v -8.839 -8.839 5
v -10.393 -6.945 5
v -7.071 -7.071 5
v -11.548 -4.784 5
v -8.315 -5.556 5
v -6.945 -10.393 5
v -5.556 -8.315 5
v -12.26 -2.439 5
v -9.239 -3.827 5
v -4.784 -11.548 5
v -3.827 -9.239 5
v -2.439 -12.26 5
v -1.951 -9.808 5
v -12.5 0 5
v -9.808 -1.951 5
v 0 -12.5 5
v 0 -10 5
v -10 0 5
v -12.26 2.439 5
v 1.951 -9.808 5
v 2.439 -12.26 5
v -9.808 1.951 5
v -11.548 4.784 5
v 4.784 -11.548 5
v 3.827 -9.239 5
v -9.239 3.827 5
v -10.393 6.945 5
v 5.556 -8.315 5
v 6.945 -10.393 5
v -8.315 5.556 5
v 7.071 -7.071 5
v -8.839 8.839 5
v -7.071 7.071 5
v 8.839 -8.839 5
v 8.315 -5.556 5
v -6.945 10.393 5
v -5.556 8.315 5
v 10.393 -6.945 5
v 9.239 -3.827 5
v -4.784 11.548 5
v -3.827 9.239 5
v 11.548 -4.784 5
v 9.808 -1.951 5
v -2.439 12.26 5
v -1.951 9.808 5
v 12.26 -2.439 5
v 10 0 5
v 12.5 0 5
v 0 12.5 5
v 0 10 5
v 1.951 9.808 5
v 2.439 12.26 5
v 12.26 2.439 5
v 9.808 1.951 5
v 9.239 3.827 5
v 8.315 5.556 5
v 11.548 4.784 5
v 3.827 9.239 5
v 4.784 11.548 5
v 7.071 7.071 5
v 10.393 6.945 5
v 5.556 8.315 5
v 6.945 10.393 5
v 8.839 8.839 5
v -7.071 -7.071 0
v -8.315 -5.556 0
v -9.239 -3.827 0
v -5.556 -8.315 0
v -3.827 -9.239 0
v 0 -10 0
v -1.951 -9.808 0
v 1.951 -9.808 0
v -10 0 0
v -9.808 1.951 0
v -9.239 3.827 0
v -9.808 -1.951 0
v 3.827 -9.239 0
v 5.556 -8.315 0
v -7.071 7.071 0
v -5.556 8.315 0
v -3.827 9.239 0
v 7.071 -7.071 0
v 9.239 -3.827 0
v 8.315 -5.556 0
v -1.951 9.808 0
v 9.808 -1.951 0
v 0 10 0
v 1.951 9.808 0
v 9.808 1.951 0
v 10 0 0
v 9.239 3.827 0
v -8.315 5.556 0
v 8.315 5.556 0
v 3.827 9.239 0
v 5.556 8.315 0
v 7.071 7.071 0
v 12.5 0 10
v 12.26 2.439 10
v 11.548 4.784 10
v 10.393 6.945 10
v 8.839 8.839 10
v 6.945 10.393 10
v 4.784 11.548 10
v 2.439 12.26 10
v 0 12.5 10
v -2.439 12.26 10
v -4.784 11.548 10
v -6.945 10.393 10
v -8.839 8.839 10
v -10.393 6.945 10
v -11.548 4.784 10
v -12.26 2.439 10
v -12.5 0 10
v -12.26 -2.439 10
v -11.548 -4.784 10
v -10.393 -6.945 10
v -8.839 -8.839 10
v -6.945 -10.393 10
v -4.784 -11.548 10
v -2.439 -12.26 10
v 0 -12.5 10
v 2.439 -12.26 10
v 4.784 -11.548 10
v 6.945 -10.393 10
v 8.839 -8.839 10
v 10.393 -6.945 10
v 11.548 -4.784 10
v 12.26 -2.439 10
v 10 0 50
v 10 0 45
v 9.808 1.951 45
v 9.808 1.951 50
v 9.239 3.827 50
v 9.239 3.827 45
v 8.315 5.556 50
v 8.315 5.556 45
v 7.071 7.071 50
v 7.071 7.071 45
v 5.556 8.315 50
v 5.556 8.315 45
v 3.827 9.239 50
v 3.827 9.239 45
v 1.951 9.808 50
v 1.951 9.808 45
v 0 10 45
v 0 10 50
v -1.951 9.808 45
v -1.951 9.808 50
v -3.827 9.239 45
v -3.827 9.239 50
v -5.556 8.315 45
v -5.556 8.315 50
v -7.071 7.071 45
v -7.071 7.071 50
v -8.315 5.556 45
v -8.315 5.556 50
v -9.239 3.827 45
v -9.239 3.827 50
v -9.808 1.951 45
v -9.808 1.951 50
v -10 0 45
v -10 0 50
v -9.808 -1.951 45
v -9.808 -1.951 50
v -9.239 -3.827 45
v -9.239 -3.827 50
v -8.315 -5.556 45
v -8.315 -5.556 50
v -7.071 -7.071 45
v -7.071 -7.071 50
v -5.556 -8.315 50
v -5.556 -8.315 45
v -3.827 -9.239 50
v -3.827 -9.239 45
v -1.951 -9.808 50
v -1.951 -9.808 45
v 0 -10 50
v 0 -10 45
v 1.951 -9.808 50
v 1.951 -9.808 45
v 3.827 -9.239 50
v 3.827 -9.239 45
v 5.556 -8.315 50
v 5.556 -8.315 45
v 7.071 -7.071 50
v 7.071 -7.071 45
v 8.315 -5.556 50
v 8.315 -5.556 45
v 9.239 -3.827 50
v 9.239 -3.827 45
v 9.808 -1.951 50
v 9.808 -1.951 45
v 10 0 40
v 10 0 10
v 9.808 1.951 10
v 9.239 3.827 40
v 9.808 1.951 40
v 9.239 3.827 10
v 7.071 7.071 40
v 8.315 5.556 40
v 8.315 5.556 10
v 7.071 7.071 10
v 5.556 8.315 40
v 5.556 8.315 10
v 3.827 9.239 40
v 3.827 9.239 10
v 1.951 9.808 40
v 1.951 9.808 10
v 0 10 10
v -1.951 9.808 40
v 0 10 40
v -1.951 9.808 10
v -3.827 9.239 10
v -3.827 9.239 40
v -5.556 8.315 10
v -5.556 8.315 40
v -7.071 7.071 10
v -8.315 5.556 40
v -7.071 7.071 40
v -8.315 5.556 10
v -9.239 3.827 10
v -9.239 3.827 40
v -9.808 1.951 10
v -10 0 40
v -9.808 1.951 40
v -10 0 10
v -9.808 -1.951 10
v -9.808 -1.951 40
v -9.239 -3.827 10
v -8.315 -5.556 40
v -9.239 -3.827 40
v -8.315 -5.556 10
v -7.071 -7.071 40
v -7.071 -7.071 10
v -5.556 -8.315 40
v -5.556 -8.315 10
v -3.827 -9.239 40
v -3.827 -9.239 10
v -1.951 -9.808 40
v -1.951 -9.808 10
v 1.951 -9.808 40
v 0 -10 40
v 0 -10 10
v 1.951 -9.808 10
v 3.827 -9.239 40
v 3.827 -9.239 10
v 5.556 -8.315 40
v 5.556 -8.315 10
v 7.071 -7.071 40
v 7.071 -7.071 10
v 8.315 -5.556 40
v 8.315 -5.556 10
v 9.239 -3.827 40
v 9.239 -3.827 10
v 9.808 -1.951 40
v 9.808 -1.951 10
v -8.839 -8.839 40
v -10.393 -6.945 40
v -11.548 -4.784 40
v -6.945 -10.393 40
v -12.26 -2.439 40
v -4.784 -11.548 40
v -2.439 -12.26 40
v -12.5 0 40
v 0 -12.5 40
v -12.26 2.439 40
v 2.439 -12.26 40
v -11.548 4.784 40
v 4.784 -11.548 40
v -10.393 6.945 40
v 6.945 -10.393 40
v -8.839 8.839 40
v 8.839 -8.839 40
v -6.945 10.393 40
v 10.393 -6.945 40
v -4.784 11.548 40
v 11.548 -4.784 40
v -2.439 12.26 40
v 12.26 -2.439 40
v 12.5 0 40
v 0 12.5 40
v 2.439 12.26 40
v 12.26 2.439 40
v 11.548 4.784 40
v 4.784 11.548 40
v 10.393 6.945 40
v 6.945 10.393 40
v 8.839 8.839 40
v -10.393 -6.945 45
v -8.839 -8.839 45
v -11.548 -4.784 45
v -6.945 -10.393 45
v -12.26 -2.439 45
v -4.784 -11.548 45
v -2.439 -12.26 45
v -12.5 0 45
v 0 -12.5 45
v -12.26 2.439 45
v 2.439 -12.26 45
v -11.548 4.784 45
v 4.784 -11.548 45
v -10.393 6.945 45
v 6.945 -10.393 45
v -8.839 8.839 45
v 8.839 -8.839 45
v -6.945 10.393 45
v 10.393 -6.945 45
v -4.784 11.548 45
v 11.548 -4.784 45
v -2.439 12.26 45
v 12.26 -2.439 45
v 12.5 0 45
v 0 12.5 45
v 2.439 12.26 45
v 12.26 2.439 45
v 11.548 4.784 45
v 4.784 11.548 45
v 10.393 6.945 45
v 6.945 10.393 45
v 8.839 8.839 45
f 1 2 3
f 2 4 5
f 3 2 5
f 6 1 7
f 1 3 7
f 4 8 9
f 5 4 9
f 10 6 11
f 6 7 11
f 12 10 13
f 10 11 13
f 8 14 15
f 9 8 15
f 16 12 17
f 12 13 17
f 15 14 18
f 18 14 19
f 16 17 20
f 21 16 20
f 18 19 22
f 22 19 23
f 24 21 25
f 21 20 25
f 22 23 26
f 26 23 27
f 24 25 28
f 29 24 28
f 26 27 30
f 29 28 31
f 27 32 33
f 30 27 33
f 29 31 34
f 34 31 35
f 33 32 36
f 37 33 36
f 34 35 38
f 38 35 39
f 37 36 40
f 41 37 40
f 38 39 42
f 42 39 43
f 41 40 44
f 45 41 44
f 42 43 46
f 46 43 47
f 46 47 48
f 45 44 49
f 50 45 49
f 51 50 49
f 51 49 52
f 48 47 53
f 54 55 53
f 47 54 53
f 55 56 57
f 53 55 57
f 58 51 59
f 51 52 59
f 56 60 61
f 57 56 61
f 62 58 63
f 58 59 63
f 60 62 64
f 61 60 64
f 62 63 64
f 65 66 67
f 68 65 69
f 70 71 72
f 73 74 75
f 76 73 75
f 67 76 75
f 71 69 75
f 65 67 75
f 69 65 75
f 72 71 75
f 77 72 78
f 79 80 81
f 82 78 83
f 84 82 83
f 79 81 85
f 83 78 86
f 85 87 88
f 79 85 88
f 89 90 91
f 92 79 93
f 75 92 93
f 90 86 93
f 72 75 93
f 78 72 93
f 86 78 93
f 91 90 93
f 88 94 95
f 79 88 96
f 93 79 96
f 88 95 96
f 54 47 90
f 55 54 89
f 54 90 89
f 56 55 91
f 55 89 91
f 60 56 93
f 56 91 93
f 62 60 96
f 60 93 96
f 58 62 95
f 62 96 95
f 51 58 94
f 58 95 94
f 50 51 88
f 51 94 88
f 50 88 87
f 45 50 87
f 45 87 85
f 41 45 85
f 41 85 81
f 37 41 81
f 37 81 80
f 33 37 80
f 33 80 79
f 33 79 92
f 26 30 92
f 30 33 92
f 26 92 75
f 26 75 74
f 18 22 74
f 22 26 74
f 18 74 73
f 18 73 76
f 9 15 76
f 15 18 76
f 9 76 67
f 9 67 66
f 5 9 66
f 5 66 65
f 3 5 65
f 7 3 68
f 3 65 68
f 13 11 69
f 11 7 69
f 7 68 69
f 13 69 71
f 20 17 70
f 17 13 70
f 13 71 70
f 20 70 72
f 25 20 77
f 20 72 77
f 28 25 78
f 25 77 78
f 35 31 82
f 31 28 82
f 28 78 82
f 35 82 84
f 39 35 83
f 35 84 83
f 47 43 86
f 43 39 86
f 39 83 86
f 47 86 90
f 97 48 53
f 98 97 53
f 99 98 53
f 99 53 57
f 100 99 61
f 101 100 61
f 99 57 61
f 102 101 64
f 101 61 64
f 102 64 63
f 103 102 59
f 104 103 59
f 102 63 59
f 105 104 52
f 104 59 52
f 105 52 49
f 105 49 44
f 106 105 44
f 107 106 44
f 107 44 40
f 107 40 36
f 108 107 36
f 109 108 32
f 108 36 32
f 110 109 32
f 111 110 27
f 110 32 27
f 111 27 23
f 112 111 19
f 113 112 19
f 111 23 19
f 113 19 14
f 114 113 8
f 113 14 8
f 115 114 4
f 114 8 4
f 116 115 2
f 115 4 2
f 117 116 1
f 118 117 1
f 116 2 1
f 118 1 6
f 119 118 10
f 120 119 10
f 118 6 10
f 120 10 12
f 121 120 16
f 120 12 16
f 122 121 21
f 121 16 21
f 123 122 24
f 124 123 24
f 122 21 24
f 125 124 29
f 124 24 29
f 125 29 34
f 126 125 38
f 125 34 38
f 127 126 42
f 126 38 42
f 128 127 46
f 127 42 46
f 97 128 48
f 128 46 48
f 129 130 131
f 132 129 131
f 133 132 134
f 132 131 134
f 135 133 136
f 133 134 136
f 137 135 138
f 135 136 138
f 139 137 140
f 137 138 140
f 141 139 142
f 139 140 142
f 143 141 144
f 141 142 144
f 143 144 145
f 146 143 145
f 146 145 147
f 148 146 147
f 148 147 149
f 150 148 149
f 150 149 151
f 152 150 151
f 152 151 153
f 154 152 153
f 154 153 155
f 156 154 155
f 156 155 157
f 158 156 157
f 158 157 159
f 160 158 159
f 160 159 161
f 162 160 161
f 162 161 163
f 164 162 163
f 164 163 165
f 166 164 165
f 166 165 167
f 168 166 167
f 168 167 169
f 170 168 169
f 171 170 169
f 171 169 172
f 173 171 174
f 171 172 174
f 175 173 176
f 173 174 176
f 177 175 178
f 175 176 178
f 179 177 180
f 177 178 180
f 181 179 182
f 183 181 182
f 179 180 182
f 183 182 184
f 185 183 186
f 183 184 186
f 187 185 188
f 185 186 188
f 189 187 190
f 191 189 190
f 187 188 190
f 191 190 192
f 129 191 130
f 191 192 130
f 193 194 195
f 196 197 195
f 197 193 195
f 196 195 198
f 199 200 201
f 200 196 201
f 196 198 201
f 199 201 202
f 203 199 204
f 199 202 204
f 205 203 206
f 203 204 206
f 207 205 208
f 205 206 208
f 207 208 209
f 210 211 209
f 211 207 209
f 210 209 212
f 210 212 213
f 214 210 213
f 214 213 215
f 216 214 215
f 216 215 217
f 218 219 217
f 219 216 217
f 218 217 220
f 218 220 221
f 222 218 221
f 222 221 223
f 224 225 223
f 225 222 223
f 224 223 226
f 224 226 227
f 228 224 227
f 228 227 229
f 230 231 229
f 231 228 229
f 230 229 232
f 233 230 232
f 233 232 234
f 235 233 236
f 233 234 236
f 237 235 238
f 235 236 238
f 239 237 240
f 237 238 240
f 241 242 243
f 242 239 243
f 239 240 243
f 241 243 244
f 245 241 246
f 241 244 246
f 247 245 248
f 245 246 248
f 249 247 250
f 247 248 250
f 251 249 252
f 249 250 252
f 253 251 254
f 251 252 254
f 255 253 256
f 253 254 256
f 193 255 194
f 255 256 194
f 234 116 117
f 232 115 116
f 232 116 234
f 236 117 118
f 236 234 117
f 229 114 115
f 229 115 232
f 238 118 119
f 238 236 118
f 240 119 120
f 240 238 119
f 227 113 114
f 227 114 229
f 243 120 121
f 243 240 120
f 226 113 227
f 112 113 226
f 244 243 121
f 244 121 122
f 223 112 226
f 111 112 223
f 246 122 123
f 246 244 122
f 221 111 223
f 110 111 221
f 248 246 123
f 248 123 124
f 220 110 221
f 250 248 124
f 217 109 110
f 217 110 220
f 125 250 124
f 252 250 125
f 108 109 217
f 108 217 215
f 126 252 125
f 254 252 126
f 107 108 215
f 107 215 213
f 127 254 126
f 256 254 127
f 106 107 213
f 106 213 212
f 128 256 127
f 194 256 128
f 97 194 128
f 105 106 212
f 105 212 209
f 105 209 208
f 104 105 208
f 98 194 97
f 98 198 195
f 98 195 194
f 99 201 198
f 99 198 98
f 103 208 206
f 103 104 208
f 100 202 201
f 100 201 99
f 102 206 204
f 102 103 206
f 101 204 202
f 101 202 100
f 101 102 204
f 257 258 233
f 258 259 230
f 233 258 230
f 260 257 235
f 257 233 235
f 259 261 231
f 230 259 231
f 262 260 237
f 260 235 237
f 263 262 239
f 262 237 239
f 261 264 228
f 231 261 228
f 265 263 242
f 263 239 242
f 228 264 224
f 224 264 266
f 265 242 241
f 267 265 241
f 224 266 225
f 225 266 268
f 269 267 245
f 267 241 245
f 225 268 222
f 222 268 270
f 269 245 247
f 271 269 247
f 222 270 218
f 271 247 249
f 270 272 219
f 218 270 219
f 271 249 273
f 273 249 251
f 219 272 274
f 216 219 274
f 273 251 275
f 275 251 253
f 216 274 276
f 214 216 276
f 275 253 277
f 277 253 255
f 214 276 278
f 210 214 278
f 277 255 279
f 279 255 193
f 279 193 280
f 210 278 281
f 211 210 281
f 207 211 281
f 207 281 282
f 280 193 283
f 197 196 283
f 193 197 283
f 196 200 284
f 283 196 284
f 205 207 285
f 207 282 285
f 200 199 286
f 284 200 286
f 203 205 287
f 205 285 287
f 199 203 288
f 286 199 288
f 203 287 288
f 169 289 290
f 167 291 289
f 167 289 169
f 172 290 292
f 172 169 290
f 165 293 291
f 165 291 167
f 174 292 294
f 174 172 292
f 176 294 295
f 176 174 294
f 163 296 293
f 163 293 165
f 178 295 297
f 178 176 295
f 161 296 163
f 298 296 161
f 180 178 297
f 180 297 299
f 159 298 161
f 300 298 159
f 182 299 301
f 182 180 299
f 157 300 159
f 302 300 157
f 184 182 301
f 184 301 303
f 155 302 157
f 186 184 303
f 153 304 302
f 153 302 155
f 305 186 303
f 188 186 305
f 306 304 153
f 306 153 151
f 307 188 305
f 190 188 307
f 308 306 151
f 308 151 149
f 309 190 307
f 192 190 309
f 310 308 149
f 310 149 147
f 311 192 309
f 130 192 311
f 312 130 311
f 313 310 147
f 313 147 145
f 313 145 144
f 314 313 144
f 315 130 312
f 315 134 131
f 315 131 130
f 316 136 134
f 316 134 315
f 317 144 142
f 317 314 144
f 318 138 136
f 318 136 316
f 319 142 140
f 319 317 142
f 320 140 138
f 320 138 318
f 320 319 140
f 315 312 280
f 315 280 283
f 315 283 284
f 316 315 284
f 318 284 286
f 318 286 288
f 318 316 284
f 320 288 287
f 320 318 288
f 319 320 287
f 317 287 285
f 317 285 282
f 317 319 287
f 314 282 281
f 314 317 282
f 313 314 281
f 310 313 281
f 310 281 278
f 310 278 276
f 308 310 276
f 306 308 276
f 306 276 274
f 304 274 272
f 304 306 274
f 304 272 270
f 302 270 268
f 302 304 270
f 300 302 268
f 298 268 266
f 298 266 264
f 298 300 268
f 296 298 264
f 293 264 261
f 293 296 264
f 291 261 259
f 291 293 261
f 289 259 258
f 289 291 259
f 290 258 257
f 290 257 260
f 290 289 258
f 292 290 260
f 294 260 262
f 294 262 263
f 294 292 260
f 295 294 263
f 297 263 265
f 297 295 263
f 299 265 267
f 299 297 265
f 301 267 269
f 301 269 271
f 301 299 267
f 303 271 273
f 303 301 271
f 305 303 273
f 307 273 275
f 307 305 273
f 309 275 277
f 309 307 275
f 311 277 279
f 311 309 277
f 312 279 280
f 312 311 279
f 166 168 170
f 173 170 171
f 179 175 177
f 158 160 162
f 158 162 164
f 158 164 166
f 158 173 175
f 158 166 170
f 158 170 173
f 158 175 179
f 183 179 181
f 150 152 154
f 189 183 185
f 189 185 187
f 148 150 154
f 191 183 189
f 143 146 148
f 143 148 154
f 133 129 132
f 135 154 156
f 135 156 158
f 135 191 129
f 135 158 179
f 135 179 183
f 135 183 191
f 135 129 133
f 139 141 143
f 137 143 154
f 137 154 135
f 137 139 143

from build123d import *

# Parameters (mm, degrees)
SKETCH1_R           = 10
BOSS_EXTRUDE1_DEPTH = 50
BOSS_EXTRUDE2_START = -5
SKETCH2_R           = 12.5
BOSS_EXTRUDE2_DEPTH = 5


with BuildPart() as part:
    # Sketch1 → Boss-Extrude1 (new body)
    with BuildSketch(Plane.XY):
        Circle(SKETCH1_R)
    extrude(amount=BOSS_EXTRUDE1_DEPTH)

    # Sketch2 → Boss-Extrude2 (add)
    with BuildSketch(Plane.XY.offset(50).offset(BOSS_EXTRUDE2_START)):
        Circle(SKETCH2_R)
    boss_extrude2 = extrude(amount=-BOSS_EXTRUDE2_DEPTH)

    # Mirror1: Boss-Extrude2 across plane
    add(boss_extrude2.mirror(Plane.XY.offset(25)))


solid = part.part
